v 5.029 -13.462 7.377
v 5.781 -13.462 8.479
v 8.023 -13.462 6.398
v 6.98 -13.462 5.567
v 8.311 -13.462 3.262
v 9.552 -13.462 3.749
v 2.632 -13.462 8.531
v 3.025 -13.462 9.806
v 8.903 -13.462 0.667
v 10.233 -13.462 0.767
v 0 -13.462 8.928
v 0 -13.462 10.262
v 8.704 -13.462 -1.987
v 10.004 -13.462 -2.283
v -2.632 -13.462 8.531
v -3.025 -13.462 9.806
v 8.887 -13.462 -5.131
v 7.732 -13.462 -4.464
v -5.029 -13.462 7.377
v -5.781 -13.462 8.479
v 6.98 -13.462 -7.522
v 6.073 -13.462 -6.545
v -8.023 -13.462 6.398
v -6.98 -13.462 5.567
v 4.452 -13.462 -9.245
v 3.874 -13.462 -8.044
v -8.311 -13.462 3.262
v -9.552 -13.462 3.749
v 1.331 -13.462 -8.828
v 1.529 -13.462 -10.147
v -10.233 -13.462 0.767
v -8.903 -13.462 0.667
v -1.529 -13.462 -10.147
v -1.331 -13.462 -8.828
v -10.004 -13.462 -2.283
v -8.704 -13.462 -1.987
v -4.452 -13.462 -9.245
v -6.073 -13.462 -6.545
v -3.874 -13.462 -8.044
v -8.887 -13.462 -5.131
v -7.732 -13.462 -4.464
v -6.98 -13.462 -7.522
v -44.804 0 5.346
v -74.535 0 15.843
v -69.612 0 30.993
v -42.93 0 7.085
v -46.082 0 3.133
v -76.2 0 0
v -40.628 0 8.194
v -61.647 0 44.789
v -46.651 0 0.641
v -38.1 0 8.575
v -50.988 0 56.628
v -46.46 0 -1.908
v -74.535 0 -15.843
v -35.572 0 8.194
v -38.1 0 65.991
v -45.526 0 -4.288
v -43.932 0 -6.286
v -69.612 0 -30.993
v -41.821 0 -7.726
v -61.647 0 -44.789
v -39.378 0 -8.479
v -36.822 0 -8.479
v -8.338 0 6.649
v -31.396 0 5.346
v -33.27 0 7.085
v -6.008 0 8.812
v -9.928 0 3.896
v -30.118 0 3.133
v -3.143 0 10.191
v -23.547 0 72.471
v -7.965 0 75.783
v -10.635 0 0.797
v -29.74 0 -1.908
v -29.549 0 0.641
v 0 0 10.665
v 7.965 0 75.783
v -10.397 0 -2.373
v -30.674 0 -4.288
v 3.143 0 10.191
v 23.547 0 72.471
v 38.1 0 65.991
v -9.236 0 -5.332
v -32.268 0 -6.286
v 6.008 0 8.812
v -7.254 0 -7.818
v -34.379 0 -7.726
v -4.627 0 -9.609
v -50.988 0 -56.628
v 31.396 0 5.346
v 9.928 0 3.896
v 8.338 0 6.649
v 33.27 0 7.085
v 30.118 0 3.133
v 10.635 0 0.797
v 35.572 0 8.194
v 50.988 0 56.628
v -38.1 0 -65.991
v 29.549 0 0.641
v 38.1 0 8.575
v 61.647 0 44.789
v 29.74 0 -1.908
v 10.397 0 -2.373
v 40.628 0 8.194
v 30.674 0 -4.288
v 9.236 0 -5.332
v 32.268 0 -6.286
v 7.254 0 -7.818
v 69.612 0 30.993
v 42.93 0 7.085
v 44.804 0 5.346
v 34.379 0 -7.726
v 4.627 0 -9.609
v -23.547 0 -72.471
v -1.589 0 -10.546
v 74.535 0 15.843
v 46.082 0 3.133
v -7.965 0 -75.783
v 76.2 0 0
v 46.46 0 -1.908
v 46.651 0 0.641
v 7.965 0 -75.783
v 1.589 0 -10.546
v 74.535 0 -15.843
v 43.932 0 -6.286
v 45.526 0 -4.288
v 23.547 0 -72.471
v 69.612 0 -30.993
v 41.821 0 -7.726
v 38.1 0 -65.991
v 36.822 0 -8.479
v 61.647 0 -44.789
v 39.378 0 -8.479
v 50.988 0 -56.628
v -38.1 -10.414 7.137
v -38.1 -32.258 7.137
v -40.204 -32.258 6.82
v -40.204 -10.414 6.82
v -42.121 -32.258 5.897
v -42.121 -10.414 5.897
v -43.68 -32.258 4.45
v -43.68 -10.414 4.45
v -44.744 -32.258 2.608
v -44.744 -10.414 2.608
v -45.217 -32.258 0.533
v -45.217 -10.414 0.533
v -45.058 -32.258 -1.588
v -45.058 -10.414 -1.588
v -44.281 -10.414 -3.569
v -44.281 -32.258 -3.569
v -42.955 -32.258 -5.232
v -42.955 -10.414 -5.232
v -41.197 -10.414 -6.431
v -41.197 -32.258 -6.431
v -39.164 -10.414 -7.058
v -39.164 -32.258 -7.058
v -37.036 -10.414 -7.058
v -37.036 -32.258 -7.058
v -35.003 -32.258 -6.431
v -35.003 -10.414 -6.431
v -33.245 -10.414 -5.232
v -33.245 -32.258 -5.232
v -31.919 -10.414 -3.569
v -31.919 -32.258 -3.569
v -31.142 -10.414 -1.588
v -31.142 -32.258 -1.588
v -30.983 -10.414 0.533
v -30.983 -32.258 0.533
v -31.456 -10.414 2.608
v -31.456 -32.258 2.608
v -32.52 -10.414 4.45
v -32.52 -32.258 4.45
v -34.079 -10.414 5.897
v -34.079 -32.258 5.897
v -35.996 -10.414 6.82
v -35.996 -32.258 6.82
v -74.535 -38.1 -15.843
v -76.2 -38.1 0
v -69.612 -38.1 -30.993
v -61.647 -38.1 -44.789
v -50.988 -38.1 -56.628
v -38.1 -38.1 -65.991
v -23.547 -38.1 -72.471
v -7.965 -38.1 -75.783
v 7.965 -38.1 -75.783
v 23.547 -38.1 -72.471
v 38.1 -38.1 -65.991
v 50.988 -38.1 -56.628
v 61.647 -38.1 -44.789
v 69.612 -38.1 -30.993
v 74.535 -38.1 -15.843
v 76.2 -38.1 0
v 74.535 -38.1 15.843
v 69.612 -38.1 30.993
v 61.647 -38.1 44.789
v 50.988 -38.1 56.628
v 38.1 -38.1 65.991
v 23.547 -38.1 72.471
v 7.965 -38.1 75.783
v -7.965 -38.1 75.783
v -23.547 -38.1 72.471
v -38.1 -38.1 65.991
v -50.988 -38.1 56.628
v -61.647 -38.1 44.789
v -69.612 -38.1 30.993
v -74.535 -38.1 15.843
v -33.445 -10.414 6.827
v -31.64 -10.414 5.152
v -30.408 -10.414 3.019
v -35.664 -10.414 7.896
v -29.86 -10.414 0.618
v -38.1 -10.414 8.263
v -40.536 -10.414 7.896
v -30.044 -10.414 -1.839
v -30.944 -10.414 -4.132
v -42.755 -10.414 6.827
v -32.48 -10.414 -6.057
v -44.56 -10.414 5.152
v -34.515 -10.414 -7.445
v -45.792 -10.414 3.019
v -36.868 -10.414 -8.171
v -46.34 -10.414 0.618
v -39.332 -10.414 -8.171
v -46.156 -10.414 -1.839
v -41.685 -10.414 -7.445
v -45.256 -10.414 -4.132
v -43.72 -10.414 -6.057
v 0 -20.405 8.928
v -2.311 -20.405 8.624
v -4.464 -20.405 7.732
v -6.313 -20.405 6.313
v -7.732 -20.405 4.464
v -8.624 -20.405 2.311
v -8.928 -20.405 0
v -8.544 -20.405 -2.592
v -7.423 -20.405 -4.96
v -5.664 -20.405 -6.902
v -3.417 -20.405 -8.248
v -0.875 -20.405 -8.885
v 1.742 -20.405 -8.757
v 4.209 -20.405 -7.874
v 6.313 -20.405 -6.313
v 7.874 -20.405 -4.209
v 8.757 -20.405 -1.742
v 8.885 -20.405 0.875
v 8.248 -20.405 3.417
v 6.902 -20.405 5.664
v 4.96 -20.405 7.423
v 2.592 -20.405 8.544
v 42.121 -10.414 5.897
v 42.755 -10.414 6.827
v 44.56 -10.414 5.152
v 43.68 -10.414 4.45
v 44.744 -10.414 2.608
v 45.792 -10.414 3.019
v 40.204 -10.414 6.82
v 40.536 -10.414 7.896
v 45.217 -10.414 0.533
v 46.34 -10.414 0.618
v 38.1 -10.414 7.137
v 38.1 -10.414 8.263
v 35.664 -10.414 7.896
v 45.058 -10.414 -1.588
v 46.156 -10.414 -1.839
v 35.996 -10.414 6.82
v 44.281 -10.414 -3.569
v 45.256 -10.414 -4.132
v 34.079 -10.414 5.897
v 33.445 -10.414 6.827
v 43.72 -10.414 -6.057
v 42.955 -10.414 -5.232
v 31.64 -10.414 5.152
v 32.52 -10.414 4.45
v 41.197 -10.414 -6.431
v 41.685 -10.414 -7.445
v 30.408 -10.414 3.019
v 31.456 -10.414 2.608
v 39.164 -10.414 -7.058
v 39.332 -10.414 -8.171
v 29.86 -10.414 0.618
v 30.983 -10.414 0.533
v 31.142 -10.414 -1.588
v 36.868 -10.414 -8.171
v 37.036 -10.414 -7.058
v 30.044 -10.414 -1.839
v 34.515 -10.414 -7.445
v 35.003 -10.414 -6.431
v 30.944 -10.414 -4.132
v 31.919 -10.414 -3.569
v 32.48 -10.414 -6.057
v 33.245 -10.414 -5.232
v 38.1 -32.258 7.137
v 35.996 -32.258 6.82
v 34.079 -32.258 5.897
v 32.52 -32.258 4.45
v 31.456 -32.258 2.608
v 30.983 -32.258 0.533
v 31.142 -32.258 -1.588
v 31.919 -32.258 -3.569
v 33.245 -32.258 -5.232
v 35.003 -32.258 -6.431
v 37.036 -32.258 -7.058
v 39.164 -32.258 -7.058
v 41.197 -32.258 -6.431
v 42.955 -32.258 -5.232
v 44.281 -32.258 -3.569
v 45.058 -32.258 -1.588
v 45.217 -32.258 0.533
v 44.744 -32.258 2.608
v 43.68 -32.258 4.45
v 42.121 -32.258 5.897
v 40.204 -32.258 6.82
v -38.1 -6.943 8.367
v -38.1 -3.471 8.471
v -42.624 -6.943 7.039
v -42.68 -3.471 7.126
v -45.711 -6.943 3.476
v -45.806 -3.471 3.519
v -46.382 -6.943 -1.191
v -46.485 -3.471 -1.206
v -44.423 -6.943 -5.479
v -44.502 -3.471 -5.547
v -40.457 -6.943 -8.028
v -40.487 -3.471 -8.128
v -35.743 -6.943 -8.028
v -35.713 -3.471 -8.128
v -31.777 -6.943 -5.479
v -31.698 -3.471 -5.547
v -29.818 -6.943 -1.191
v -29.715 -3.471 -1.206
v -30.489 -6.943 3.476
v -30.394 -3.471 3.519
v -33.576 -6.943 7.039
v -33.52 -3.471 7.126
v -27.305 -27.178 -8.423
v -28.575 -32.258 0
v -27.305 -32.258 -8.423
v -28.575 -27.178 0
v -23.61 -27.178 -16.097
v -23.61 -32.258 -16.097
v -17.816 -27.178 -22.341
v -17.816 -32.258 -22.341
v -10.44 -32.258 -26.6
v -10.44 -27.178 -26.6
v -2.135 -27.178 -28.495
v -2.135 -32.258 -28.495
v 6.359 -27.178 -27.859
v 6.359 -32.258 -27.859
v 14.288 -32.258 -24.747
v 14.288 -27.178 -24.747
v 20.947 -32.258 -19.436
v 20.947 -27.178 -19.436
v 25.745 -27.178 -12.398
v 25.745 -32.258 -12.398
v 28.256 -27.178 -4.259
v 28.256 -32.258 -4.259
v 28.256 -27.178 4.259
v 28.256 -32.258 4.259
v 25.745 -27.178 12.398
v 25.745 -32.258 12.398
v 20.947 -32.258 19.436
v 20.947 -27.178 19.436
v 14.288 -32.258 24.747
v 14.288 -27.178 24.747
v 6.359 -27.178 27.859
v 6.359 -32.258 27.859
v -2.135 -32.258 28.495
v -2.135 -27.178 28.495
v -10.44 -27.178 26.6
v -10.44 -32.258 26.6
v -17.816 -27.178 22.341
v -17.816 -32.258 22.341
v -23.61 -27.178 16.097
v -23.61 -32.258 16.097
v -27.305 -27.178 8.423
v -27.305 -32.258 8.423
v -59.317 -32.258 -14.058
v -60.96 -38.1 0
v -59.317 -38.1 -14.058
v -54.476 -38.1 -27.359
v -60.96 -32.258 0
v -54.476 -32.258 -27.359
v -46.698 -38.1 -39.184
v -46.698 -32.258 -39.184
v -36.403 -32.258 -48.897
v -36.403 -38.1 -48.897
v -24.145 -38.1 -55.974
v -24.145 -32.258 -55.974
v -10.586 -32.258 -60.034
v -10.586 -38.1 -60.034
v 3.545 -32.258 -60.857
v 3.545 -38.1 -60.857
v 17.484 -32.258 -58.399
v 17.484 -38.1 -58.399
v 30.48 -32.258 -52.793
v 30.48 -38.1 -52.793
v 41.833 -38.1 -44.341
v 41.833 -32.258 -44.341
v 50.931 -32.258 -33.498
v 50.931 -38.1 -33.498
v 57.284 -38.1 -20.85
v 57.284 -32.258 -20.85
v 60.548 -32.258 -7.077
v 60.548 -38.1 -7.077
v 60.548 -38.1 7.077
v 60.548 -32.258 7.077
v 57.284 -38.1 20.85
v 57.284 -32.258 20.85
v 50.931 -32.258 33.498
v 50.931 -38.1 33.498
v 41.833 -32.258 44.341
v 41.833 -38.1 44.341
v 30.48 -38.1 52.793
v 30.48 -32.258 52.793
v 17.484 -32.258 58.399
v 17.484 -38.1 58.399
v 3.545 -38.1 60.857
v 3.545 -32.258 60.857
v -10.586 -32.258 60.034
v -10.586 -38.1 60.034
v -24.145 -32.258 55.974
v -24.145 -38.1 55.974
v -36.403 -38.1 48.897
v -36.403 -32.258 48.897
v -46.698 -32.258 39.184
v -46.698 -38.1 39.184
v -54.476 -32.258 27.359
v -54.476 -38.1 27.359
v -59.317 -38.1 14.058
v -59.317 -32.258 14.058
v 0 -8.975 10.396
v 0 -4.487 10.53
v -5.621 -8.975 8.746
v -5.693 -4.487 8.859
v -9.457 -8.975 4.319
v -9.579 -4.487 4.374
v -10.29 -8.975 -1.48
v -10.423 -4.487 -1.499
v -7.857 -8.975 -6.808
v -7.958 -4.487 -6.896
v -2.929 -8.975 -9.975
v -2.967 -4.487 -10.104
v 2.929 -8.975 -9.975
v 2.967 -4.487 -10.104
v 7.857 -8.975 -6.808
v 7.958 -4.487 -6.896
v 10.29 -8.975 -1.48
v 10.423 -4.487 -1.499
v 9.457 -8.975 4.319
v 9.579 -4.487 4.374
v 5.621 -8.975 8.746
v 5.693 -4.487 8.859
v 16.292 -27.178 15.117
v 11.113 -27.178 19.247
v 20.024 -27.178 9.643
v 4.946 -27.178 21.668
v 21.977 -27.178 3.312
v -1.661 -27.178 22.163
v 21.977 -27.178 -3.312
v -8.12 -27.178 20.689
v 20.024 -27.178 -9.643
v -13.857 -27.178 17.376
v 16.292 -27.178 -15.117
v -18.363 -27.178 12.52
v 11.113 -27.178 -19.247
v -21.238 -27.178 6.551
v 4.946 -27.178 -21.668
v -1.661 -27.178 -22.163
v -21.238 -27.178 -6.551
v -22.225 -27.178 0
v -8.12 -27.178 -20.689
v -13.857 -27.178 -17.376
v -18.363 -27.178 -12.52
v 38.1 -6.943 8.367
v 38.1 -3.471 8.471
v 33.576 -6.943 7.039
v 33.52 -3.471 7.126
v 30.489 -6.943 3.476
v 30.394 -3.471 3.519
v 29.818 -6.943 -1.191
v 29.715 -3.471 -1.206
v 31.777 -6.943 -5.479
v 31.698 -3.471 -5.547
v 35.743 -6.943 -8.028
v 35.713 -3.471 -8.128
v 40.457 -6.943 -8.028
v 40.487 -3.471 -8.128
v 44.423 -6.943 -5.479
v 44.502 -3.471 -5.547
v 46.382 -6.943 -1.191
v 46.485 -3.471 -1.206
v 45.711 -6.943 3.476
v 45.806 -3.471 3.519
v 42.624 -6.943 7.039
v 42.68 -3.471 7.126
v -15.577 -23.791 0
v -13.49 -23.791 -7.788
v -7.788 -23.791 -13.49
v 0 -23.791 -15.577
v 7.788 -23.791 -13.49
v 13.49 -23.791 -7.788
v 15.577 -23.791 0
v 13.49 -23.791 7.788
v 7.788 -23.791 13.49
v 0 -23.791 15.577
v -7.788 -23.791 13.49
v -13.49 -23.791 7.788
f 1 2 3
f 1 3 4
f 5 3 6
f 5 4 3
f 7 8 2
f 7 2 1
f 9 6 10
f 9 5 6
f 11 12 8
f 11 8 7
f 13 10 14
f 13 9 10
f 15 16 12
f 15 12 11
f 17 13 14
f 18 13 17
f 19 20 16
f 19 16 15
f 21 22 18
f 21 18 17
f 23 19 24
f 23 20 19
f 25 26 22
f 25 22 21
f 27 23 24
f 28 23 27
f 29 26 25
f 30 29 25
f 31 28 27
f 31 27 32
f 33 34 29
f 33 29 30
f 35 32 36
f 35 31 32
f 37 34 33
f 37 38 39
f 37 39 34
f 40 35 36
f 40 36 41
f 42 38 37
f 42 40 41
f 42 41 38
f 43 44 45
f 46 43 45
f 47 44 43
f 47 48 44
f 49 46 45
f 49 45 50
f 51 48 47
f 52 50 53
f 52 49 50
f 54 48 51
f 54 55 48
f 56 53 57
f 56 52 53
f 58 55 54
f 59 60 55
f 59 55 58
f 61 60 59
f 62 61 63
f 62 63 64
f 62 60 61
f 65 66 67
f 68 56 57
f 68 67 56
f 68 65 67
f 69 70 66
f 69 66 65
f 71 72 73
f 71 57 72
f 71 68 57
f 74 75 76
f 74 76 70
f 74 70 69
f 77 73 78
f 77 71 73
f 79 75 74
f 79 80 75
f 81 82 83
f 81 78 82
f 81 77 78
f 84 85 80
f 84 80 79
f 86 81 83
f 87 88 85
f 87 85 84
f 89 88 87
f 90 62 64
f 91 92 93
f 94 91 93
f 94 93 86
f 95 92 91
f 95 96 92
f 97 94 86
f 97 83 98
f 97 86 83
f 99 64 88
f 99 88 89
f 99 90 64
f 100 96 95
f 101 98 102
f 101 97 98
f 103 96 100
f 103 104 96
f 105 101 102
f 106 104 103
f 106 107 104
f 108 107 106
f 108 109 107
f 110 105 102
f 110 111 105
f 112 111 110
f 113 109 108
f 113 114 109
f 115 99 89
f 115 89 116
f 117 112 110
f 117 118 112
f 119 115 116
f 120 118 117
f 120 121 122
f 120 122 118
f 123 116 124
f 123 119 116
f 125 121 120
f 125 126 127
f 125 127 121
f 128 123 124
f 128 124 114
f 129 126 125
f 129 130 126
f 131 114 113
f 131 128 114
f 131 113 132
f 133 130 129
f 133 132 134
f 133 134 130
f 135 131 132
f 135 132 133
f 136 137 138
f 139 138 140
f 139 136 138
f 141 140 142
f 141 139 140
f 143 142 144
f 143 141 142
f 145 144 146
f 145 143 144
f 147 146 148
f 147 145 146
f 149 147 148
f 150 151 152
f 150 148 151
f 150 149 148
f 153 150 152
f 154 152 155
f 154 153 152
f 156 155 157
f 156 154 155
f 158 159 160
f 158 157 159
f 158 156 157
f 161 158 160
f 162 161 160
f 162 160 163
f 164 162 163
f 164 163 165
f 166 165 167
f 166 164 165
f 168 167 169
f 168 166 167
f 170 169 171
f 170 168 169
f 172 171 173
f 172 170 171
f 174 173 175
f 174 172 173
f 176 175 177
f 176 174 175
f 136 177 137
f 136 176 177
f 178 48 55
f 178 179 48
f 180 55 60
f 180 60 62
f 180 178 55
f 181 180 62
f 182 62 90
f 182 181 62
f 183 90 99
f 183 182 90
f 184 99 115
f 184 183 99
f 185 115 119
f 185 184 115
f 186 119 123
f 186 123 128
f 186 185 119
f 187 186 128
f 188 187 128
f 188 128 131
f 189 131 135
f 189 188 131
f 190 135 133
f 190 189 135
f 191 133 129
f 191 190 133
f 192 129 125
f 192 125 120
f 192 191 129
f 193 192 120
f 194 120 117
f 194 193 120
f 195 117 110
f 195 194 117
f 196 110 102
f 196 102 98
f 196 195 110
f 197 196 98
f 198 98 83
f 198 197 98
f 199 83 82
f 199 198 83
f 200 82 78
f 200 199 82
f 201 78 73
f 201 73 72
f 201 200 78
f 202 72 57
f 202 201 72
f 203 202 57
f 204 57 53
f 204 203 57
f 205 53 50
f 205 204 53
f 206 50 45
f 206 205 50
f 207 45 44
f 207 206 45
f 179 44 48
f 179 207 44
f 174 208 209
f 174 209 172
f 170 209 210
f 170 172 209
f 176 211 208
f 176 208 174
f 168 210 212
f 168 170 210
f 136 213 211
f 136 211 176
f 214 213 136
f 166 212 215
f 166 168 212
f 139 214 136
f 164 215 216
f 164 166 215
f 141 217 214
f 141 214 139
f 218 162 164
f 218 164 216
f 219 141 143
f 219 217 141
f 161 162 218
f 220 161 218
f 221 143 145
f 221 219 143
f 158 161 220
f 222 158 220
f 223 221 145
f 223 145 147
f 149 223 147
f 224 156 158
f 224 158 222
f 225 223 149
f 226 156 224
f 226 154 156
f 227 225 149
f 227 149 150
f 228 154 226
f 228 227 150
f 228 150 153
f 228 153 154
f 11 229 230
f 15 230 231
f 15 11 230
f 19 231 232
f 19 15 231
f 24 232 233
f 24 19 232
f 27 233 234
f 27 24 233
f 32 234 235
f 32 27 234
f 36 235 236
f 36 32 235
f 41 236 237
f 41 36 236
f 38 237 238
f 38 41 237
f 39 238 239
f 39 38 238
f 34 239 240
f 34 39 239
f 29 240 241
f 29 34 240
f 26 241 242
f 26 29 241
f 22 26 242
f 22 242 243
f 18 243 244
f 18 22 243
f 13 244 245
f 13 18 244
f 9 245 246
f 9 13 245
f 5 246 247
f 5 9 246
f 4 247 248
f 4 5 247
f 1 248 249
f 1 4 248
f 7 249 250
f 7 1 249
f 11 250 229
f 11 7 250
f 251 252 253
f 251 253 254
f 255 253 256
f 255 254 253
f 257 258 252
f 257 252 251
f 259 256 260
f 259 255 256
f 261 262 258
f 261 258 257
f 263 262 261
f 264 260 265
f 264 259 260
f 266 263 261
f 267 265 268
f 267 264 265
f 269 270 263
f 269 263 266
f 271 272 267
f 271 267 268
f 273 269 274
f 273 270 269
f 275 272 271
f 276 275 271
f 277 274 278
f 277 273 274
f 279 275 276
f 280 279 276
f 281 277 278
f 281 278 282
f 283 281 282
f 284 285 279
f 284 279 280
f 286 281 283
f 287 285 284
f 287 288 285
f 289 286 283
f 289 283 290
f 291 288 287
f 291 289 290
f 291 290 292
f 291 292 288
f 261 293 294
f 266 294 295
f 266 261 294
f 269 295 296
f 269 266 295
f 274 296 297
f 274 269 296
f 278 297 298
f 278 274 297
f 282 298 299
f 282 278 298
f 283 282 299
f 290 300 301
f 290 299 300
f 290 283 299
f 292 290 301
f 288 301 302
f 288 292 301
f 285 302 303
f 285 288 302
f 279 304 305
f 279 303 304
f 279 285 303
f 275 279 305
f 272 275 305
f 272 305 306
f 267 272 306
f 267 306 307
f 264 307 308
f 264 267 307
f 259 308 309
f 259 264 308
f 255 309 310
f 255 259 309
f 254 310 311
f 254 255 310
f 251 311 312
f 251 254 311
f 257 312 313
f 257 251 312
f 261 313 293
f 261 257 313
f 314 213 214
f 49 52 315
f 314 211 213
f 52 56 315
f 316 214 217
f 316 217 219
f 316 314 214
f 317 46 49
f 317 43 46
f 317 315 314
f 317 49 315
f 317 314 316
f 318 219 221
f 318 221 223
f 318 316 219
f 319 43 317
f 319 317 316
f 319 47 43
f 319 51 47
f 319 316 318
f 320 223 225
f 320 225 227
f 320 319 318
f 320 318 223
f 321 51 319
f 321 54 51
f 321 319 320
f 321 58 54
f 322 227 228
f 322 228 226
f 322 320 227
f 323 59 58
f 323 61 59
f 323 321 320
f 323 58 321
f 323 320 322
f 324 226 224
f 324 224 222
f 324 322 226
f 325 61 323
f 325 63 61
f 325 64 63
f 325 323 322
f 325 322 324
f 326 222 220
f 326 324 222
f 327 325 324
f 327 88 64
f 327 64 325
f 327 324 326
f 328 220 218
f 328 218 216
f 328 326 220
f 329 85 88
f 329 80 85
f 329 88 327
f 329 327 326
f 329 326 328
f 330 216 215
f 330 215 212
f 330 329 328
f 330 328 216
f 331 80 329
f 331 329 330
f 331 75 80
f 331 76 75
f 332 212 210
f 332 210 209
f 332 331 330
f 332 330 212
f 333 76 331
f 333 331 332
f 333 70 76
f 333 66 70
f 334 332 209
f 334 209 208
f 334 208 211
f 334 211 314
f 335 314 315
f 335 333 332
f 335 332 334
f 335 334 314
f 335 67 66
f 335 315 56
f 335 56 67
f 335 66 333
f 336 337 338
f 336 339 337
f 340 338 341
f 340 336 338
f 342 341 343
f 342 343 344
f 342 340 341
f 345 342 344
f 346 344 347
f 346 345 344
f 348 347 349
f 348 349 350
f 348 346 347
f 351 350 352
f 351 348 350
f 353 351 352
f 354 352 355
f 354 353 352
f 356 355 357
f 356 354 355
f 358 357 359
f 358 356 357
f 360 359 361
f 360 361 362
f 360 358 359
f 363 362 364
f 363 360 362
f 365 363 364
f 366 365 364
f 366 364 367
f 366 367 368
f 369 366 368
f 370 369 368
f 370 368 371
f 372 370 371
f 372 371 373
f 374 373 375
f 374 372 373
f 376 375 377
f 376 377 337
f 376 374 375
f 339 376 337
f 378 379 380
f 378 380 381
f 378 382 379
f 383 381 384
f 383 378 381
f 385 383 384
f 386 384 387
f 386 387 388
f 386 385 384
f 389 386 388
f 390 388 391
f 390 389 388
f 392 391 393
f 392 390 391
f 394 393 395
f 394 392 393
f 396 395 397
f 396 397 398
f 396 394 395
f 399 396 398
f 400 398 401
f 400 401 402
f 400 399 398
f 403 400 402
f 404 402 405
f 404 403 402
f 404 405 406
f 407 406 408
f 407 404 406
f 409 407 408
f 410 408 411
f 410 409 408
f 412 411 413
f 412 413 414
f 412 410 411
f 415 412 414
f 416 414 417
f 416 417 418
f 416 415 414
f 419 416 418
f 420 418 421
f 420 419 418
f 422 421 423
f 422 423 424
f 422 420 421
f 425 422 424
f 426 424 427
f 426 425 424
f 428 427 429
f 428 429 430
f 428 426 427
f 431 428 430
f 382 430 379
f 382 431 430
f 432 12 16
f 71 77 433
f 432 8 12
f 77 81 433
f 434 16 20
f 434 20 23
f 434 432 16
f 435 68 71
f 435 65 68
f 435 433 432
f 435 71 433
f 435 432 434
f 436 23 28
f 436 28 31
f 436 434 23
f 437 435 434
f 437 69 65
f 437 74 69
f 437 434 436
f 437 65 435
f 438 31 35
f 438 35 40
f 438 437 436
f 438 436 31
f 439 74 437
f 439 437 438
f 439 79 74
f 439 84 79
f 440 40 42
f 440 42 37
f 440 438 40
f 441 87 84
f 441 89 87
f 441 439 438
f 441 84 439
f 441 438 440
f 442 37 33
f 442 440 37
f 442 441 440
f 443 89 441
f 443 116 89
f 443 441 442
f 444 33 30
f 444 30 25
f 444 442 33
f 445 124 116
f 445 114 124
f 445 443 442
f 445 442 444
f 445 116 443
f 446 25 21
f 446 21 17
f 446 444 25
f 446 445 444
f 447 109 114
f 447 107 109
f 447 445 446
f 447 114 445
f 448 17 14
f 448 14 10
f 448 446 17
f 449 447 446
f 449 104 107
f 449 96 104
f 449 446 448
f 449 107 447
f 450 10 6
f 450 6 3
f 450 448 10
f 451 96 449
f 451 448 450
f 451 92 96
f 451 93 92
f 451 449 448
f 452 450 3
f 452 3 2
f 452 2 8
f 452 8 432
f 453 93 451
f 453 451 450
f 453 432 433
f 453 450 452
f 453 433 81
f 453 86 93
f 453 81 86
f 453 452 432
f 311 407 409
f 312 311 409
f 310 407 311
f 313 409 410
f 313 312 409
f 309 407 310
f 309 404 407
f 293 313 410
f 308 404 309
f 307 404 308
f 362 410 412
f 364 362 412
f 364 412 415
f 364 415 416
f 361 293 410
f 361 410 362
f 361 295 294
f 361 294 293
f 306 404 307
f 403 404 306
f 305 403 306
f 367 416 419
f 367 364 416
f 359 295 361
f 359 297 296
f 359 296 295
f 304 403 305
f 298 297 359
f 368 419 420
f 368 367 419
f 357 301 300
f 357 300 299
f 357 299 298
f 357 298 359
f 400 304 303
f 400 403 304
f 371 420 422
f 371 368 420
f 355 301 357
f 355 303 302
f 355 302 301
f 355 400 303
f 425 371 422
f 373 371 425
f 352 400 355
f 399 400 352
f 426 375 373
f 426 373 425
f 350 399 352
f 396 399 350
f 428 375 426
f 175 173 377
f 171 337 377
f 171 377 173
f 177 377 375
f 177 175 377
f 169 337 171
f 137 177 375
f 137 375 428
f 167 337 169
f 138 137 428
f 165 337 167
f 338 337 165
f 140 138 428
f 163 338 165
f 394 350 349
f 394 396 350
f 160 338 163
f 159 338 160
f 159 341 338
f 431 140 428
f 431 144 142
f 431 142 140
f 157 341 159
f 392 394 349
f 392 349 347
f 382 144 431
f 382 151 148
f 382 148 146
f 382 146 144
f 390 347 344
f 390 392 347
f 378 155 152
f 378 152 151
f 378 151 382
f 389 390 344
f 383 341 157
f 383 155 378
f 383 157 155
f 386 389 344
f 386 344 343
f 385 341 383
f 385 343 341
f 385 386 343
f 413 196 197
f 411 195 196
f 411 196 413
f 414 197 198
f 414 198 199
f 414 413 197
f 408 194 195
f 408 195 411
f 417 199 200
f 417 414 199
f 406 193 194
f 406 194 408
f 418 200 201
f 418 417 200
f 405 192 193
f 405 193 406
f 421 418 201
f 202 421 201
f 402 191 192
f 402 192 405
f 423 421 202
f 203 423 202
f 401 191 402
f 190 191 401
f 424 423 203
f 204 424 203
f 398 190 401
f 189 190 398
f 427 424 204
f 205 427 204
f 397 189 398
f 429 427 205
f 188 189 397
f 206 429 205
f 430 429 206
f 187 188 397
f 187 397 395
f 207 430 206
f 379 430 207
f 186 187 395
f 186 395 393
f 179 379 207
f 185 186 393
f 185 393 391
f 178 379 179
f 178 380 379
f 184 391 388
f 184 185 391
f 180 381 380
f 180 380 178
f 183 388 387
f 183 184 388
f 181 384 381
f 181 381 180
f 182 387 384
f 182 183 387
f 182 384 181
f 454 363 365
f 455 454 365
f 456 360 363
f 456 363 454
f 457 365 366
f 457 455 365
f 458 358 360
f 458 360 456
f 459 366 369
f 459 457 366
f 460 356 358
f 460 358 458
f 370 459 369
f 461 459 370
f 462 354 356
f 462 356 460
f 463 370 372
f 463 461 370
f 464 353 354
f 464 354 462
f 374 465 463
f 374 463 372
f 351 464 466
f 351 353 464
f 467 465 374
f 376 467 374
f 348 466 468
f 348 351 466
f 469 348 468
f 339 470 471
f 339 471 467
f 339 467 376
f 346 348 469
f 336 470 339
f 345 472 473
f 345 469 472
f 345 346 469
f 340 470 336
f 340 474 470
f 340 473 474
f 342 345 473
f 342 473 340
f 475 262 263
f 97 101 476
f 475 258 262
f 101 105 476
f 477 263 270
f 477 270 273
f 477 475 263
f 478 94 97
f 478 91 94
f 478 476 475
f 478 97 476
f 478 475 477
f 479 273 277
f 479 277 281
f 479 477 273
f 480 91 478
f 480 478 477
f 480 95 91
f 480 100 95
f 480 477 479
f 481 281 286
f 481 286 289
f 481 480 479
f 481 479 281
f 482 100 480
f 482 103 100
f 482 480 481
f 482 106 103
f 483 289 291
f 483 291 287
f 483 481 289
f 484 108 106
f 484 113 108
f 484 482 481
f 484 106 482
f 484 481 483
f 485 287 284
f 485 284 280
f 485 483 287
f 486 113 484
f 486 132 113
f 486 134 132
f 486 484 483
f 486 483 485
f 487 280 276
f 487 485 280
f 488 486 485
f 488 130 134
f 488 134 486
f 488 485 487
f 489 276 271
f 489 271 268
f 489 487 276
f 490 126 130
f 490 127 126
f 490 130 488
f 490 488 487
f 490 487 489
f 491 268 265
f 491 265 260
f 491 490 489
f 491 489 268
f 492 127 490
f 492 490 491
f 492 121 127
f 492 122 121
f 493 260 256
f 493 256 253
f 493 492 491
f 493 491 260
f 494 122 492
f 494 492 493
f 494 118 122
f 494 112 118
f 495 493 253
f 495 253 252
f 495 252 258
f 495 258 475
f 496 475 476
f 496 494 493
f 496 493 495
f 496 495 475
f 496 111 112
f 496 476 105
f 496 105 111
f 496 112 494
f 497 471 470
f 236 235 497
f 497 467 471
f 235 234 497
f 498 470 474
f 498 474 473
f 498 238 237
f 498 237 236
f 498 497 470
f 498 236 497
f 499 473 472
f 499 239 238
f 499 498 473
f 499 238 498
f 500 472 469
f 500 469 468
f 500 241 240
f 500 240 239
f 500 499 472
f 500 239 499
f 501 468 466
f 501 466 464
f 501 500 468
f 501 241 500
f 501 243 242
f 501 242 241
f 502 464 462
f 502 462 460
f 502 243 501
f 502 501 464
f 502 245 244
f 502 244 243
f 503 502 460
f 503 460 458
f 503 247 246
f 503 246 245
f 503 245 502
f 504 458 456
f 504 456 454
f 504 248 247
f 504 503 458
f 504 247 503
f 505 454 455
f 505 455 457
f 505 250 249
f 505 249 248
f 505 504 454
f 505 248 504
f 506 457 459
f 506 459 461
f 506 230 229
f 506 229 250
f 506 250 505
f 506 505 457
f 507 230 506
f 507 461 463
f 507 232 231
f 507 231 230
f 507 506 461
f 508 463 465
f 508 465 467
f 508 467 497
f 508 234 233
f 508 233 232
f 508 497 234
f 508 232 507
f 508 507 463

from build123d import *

# Parameters (mm, degrees)
F_3_8_NPT_TAPPED_HOLE1_AT_2_COUNT = 2
F_3_8_NPT_TAPPED_HOLE1_AT_2_PITCH = 76.2


with BuildPart() as part:
    # Sketch1 → Revolve1 (revolve)
    with BuildSketch(Plane.XY):
        Polygon((0, 0), (-76.2, 0), (-76.2, -38.1), (-60.96, -38.1), (-60.96, -32.258), (-55.7149, -32.258), (-51.6509, -32.258), (-32.163982831, -32.258), (-30.364664072, -32.258), (-28.575, -32.258), (-28.575, -27.178), (-28.0924, -27.178), (-24.0284, -27.178), (-22.225, -27.178), (0, -15.85722), align=None)
    revolve(axis=Axis((0, 0, 0), (0, -1, 0)))

    # Sketch3 → 1/2 NPT Tapped Hole1 (revolve, cut)
    with BuildSketch(Plane(origin=(0, 0, 0), x_dir=(0, 0, 1), z_dir=(1, 0, 0))):
        Polygon((0, 0), (0, 38.1), (8.9281, 38.1), (8.9281, 13.462), (10.261665792, 13.462), (10.6647361, 0), align=None)
    revolve(axis=Axis((0, 6.35, 0), (0, -1, 0)), mode=Mode.SUBTRACT)

    # Sketch5 → 3/8 NPT Tapped Hole1 (revolve, cut)
    with BuildSketch(Plane(origin=(-38.1, 0, 0), x_dir=(0, 0, 1), z_dir=(1, 0, 0))):
        Polygon((0, 0), (0, 38.1), (7.1374, 38.1), (7.1374, 10.414), (8.263205494, 10.414), (8.5750146, 0), align=None)
    f_3_8_npt_tapped_hole1 = revolve(axis=Axis((-38.1, 6.35, 0), (0, -1, 0)), mode=Mode.SUBTRACT)

    # 3/8 NPT Tapped Hole1 at 2: 3/8 NPT Tapped Hole1 ×2
    with Locations(*[(i * F_3_8_NPT_TAPPED_HOLE1_AT_2_PITCH, 0, 0) for i in range(1, F_3_8_NPT_TAPPED_HOLE1_AT_2_COUNT)]):
        add(f_3_8_npt_tapped_hole1, mode=Mode.SUBTRACT)


solid = part.part
